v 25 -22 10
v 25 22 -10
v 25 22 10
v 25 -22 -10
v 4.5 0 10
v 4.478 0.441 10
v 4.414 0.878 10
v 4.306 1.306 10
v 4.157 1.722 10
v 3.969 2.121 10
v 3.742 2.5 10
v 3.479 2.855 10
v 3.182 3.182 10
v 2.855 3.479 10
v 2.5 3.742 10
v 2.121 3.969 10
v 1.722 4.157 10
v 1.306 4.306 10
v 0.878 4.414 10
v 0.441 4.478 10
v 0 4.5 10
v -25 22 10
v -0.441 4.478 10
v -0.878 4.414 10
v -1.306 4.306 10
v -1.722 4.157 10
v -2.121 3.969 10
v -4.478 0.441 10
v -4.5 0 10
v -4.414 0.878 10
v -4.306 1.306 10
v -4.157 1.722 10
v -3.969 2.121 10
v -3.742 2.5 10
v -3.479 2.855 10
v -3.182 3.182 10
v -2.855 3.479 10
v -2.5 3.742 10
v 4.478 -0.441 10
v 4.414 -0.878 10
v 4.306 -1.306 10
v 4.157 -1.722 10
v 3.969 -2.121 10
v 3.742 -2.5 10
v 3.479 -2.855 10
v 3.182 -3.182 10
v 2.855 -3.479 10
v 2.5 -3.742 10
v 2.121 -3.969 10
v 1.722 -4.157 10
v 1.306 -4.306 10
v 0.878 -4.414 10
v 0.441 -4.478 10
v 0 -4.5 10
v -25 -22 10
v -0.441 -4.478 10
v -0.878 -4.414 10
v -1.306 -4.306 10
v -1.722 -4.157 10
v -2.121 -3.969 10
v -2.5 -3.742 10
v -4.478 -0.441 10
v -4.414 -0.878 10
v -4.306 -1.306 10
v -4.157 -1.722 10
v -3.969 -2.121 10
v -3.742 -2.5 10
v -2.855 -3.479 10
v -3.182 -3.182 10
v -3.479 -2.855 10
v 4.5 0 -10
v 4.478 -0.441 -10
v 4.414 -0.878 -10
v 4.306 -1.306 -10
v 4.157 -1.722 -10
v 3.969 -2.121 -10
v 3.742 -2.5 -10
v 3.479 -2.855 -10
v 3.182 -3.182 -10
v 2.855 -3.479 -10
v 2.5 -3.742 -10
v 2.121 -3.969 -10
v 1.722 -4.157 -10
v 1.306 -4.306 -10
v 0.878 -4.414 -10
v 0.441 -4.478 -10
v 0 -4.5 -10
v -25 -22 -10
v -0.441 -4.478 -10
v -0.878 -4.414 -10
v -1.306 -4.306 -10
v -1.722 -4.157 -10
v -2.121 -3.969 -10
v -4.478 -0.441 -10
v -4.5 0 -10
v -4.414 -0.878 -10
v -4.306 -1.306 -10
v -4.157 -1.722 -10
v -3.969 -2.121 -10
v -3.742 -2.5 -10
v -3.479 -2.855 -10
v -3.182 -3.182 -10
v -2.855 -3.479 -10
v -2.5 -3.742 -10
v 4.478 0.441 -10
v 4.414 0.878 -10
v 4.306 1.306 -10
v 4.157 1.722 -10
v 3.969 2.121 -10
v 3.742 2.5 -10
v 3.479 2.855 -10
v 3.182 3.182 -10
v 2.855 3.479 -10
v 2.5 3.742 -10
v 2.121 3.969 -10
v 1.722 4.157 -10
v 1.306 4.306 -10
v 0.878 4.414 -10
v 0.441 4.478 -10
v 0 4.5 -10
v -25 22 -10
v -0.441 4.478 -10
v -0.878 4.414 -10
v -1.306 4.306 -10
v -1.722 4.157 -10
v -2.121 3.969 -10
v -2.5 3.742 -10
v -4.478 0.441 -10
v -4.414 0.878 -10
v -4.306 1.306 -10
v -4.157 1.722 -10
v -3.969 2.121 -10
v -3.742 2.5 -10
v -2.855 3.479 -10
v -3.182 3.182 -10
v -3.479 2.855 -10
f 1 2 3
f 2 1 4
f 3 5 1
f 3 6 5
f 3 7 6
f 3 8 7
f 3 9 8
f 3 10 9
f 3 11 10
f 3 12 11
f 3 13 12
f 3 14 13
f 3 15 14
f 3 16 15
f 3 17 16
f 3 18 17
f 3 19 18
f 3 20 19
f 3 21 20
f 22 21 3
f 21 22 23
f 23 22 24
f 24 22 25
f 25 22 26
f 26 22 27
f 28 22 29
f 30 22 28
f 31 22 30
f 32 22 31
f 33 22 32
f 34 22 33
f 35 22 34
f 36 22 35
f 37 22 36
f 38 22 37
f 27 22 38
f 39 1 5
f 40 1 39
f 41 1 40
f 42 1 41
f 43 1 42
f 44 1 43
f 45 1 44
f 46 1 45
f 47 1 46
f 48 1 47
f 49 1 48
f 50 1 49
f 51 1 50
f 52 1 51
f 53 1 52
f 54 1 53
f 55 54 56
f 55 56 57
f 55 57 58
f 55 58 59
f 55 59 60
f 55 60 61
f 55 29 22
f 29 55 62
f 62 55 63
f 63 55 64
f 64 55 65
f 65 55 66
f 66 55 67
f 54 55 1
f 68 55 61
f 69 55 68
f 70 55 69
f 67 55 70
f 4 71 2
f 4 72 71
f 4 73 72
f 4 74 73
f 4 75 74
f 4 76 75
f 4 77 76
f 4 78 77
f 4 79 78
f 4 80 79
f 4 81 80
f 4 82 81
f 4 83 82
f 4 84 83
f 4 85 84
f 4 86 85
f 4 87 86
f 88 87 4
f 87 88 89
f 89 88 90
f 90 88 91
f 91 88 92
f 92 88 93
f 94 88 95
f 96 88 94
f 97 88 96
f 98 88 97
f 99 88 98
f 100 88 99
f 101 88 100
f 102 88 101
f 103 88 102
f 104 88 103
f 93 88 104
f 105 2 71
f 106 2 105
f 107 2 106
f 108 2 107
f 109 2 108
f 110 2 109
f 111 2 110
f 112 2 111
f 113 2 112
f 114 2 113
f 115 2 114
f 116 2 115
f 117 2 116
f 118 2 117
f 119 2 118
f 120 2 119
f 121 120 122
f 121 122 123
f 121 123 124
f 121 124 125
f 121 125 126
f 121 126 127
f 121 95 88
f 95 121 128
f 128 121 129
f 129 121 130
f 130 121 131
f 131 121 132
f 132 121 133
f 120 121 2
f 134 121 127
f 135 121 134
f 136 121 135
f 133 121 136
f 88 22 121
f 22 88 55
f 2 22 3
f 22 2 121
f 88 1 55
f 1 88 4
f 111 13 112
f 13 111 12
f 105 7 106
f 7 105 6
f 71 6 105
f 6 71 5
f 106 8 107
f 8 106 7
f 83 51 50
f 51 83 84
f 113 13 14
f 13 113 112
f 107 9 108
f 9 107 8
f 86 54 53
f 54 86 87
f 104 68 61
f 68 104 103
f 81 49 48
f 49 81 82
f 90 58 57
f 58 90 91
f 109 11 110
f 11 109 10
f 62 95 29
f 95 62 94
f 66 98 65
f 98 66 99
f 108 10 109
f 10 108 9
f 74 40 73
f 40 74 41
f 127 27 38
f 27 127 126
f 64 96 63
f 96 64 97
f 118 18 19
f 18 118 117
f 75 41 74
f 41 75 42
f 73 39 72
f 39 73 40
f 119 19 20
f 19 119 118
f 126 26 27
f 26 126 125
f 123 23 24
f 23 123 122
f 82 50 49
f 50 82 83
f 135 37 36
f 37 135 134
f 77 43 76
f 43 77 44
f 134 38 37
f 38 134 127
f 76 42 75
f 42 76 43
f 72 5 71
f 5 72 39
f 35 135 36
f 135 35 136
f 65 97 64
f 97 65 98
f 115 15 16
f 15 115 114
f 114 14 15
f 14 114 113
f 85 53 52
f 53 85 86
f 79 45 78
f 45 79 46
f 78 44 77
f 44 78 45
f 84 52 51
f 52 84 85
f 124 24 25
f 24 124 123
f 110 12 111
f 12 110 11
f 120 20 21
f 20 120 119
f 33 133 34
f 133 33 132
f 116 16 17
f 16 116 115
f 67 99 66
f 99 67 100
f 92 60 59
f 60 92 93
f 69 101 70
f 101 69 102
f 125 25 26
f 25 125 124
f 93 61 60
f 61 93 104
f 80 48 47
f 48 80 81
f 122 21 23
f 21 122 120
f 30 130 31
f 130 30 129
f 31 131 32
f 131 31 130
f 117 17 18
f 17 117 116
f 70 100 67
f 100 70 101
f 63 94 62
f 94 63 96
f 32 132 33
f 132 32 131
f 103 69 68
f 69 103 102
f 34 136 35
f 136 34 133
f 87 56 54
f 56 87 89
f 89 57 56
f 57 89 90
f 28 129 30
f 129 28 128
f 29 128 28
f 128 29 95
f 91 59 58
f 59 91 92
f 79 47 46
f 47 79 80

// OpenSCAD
module linear_bearing_block() {
    difference() {
        // Main block
        cube([50, 44, 20], center = true);
        
        // Shaft hole
        translate([0, 0, -10])
            cylinder(h = 40, d = 9, $fn = 64, center = true);
    }
}

linear_bearing_block();
